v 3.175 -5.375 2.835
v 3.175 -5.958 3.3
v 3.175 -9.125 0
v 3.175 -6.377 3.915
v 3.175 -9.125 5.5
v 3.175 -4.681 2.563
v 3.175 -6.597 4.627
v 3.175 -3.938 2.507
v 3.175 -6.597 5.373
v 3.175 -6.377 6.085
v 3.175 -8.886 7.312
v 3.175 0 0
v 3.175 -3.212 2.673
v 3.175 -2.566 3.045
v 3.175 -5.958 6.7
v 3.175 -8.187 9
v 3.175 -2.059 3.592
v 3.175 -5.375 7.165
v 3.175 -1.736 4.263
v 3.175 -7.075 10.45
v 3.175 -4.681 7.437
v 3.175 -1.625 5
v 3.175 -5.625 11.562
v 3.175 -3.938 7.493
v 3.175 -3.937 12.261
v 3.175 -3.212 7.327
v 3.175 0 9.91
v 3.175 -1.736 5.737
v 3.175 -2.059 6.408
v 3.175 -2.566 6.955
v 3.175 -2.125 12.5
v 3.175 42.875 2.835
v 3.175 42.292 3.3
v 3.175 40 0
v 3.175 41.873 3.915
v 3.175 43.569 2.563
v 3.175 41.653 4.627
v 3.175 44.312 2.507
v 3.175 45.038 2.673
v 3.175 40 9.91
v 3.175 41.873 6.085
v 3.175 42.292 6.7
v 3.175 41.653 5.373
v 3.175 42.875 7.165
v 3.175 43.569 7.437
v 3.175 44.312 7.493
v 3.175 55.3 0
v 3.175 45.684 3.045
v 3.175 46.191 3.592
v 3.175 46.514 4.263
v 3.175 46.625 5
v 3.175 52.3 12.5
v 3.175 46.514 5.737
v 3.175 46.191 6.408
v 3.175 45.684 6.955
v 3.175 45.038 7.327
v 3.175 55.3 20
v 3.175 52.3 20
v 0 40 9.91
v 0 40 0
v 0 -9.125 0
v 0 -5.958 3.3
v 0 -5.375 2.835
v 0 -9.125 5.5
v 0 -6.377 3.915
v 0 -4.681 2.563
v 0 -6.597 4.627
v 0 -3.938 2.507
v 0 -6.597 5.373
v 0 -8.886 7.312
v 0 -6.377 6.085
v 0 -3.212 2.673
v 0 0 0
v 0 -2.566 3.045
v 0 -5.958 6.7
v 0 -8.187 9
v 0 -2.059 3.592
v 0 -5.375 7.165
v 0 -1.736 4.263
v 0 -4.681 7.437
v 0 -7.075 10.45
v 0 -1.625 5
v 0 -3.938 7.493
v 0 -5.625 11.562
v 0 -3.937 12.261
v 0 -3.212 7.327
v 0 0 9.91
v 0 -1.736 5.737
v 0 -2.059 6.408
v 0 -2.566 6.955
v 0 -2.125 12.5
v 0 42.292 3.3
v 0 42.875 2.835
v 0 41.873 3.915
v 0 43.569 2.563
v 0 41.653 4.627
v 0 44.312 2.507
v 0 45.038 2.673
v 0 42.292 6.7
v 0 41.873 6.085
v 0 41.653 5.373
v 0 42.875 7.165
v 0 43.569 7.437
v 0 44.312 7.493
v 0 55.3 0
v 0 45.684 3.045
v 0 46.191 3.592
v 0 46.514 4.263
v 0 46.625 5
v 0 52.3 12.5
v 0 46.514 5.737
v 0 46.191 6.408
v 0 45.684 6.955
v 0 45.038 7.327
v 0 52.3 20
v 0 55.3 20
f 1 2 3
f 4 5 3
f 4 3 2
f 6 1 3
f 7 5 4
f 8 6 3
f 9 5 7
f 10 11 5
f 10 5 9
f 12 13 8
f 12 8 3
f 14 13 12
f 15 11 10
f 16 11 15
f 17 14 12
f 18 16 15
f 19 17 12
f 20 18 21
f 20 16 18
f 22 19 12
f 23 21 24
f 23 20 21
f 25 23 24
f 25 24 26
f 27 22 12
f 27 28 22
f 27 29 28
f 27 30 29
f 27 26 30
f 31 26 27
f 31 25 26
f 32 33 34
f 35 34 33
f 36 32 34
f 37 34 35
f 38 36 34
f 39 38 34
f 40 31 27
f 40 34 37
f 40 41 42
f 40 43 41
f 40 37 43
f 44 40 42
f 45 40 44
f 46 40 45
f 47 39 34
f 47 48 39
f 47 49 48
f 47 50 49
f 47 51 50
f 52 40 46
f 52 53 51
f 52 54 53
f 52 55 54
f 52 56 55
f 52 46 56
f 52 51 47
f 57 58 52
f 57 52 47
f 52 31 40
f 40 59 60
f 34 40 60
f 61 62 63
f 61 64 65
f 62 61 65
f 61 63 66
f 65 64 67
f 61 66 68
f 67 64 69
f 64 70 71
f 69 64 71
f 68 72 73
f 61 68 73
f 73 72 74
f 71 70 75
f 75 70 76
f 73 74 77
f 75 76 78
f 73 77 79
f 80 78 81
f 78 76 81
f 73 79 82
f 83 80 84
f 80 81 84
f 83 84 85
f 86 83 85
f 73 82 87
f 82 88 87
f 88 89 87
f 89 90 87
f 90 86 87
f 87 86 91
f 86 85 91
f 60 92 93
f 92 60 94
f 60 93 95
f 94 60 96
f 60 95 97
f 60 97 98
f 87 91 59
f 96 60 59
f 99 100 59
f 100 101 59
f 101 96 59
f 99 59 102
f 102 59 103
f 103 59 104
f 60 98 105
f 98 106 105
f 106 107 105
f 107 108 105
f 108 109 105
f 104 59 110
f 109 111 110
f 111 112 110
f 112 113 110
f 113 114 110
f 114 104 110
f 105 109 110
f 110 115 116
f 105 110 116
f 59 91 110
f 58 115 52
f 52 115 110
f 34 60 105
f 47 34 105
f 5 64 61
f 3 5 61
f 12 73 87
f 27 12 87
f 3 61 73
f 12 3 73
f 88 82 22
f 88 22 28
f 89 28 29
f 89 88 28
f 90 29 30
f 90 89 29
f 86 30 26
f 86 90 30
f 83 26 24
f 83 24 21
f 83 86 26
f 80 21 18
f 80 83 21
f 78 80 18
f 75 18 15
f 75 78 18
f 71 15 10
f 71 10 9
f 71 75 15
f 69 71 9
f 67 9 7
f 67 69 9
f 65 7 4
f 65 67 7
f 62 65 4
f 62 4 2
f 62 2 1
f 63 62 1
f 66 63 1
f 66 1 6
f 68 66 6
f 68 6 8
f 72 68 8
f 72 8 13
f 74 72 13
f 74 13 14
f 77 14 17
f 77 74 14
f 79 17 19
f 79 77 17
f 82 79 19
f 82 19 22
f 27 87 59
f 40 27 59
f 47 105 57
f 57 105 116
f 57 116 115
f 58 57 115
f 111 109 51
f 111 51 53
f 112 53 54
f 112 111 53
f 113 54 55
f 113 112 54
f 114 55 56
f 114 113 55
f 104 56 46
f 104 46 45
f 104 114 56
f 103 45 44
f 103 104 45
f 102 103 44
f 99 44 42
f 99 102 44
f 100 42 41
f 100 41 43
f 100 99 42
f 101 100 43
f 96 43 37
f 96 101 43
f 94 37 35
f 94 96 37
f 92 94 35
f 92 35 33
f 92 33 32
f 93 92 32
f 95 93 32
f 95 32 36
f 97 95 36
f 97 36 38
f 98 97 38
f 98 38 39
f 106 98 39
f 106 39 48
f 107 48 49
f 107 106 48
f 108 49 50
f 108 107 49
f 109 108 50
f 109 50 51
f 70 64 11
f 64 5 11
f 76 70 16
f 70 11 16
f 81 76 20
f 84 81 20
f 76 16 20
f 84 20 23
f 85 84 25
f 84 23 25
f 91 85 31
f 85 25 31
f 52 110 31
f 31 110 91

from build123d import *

# Parameters (mm, degrees)
F0_R     = 2.5
F1_DEPTH = 3.175
F2_R     = 7


# Not quite as in the source:
# - a length typed as a fraction of an inch, garbled in the dataset ("3 / 203.2 mm" for 3/8 in), is restored


with BuildPart() as f1:
    # F0 (on Right) → F1 (new body)
    with BuildSketch(Plane.YZ):
        Polygon((-9.125, 0), (0, 0), (0, 9.91), (20, 9.91), (40, 9.91), (40, 0), (52.3, 0), (55.3, 0), (55.3, 20), (52.3, 20), (52.3, 12.5), (-9.125, 12.5), align=None)
        with Locations((-4.125, 5)):
            Circle(F0_R, mode=Mode.SUBTRACT)
        with Locations((44.125, 5)):
            Circle(F0_R, mode=Mode.SUBTRACT)
    extrude(amount=F1_DEPTH)

    # F2
    f2_edges = [f1.edges().sort_by_distance(p)[0] for p in [
        (1.5875, -9.125, 12.5),
    ]]
    fillet(f2_edges, radius=F2_R)


solid = f1.part
